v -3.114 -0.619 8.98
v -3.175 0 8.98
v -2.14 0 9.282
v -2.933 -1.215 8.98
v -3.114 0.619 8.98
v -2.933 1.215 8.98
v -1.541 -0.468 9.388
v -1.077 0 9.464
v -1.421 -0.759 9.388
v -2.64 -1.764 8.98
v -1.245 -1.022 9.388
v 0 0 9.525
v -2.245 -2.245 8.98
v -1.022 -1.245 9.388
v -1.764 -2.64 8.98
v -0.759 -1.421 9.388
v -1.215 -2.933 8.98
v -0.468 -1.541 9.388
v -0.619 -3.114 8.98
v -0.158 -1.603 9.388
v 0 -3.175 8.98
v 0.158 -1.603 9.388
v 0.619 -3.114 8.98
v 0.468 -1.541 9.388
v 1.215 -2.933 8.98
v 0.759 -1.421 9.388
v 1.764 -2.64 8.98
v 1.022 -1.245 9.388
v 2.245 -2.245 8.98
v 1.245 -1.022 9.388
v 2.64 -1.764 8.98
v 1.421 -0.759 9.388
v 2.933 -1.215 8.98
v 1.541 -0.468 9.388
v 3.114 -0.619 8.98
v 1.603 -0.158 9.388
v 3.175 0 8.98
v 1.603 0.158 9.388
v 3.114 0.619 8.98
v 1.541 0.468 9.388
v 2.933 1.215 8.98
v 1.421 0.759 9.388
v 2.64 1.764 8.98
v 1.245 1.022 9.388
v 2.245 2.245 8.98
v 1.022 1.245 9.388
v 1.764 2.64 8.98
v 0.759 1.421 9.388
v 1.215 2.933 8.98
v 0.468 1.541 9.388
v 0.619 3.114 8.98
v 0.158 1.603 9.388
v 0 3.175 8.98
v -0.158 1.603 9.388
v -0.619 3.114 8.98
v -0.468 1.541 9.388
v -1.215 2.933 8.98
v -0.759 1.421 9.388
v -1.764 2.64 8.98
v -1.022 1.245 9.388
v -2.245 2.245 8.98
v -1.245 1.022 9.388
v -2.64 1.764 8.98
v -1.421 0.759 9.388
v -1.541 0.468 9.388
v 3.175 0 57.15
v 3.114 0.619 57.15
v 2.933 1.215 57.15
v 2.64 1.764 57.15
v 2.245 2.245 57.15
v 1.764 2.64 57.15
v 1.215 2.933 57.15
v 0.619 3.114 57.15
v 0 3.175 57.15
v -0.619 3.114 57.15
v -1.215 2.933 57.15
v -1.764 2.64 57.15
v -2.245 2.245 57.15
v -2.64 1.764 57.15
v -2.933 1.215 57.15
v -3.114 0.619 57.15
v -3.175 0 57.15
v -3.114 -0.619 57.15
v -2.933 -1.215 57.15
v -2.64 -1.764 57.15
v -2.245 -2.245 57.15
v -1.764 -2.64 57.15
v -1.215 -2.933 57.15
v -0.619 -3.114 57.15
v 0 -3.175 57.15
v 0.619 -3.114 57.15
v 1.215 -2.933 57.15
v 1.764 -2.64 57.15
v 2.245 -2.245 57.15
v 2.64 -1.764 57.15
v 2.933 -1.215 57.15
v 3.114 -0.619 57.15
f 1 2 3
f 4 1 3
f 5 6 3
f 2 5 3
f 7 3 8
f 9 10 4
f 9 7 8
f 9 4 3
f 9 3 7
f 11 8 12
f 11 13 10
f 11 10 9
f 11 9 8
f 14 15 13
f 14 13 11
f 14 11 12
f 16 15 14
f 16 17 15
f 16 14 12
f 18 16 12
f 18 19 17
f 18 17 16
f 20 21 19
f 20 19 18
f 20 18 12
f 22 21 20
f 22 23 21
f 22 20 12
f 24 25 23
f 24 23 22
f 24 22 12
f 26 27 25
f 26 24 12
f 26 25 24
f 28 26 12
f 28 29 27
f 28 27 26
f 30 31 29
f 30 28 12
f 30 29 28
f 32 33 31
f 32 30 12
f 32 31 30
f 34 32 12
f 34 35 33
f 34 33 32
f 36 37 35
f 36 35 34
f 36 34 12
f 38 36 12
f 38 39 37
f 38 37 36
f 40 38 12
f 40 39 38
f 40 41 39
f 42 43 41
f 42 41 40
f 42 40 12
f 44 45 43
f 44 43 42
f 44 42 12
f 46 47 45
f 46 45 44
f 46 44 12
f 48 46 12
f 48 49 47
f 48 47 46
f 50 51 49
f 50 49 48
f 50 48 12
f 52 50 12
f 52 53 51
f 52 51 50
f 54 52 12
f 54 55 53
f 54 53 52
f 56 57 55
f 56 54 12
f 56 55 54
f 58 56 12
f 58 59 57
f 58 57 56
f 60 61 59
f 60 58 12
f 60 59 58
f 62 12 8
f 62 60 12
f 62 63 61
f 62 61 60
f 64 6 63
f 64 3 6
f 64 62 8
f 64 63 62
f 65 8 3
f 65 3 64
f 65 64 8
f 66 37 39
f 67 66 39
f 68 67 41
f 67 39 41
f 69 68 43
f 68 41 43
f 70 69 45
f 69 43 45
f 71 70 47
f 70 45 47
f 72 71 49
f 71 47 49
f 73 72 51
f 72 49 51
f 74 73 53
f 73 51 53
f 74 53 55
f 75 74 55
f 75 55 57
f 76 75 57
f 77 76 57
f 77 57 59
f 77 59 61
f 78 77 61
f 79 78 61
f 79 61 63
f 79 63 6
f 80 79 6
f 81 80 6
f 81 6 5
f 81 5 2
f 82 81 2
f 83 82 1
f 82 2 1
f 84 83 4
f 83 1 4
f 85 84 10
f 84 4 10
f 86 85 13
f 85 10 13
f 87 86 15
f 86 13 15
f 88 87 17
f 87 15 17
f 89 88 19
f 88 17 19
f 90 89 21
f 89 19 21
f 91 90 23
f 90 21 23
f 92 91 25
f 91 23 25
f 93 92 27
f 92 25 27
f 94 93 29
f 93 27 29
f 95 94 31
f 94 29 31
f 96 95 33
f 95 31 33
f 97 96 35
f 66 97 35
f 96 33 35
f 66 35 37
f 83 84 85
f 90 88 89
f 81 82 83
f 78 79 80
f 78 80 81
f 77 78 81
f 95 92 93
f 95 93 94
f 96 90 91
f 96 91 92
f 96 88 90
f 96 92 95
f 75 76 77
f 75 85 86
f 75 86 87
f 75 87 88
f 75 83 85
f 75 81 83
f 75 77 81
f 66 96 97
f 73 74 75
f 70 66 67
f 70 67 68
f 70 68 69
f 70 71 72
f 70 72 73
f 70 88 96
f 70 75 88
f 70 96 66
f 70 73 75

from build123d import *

# Parameters (mm, degrees)
F4_R     = 3.175
F5_DEPTH = 50.8


with BuildPart() as f2:
    # F0 (on Front) → F2 (revolve)
    with BuildSketch(Plane.XZ):
        with BuildLine():
            Line((0, -9.525), (0, 9.525))
            ThreePointArc((0, 9.525), (-9.525, 0), (0, -9.525))
        make_face()
    revolve(axis=Axis((0, 0, 0), (0, 0, 1)))


with BuildPart() as f5:
    # F4 (on offset) → F5 (new body)
    with BuildSketch(Plane.XY.offset(6.35)):
        Circle(F4_R)
    extrude(amount=F5_DEPTH)

    # F6: cut F2
    add(f2.part, mode=Mode.SUBTRACT)


solid = f5.part
